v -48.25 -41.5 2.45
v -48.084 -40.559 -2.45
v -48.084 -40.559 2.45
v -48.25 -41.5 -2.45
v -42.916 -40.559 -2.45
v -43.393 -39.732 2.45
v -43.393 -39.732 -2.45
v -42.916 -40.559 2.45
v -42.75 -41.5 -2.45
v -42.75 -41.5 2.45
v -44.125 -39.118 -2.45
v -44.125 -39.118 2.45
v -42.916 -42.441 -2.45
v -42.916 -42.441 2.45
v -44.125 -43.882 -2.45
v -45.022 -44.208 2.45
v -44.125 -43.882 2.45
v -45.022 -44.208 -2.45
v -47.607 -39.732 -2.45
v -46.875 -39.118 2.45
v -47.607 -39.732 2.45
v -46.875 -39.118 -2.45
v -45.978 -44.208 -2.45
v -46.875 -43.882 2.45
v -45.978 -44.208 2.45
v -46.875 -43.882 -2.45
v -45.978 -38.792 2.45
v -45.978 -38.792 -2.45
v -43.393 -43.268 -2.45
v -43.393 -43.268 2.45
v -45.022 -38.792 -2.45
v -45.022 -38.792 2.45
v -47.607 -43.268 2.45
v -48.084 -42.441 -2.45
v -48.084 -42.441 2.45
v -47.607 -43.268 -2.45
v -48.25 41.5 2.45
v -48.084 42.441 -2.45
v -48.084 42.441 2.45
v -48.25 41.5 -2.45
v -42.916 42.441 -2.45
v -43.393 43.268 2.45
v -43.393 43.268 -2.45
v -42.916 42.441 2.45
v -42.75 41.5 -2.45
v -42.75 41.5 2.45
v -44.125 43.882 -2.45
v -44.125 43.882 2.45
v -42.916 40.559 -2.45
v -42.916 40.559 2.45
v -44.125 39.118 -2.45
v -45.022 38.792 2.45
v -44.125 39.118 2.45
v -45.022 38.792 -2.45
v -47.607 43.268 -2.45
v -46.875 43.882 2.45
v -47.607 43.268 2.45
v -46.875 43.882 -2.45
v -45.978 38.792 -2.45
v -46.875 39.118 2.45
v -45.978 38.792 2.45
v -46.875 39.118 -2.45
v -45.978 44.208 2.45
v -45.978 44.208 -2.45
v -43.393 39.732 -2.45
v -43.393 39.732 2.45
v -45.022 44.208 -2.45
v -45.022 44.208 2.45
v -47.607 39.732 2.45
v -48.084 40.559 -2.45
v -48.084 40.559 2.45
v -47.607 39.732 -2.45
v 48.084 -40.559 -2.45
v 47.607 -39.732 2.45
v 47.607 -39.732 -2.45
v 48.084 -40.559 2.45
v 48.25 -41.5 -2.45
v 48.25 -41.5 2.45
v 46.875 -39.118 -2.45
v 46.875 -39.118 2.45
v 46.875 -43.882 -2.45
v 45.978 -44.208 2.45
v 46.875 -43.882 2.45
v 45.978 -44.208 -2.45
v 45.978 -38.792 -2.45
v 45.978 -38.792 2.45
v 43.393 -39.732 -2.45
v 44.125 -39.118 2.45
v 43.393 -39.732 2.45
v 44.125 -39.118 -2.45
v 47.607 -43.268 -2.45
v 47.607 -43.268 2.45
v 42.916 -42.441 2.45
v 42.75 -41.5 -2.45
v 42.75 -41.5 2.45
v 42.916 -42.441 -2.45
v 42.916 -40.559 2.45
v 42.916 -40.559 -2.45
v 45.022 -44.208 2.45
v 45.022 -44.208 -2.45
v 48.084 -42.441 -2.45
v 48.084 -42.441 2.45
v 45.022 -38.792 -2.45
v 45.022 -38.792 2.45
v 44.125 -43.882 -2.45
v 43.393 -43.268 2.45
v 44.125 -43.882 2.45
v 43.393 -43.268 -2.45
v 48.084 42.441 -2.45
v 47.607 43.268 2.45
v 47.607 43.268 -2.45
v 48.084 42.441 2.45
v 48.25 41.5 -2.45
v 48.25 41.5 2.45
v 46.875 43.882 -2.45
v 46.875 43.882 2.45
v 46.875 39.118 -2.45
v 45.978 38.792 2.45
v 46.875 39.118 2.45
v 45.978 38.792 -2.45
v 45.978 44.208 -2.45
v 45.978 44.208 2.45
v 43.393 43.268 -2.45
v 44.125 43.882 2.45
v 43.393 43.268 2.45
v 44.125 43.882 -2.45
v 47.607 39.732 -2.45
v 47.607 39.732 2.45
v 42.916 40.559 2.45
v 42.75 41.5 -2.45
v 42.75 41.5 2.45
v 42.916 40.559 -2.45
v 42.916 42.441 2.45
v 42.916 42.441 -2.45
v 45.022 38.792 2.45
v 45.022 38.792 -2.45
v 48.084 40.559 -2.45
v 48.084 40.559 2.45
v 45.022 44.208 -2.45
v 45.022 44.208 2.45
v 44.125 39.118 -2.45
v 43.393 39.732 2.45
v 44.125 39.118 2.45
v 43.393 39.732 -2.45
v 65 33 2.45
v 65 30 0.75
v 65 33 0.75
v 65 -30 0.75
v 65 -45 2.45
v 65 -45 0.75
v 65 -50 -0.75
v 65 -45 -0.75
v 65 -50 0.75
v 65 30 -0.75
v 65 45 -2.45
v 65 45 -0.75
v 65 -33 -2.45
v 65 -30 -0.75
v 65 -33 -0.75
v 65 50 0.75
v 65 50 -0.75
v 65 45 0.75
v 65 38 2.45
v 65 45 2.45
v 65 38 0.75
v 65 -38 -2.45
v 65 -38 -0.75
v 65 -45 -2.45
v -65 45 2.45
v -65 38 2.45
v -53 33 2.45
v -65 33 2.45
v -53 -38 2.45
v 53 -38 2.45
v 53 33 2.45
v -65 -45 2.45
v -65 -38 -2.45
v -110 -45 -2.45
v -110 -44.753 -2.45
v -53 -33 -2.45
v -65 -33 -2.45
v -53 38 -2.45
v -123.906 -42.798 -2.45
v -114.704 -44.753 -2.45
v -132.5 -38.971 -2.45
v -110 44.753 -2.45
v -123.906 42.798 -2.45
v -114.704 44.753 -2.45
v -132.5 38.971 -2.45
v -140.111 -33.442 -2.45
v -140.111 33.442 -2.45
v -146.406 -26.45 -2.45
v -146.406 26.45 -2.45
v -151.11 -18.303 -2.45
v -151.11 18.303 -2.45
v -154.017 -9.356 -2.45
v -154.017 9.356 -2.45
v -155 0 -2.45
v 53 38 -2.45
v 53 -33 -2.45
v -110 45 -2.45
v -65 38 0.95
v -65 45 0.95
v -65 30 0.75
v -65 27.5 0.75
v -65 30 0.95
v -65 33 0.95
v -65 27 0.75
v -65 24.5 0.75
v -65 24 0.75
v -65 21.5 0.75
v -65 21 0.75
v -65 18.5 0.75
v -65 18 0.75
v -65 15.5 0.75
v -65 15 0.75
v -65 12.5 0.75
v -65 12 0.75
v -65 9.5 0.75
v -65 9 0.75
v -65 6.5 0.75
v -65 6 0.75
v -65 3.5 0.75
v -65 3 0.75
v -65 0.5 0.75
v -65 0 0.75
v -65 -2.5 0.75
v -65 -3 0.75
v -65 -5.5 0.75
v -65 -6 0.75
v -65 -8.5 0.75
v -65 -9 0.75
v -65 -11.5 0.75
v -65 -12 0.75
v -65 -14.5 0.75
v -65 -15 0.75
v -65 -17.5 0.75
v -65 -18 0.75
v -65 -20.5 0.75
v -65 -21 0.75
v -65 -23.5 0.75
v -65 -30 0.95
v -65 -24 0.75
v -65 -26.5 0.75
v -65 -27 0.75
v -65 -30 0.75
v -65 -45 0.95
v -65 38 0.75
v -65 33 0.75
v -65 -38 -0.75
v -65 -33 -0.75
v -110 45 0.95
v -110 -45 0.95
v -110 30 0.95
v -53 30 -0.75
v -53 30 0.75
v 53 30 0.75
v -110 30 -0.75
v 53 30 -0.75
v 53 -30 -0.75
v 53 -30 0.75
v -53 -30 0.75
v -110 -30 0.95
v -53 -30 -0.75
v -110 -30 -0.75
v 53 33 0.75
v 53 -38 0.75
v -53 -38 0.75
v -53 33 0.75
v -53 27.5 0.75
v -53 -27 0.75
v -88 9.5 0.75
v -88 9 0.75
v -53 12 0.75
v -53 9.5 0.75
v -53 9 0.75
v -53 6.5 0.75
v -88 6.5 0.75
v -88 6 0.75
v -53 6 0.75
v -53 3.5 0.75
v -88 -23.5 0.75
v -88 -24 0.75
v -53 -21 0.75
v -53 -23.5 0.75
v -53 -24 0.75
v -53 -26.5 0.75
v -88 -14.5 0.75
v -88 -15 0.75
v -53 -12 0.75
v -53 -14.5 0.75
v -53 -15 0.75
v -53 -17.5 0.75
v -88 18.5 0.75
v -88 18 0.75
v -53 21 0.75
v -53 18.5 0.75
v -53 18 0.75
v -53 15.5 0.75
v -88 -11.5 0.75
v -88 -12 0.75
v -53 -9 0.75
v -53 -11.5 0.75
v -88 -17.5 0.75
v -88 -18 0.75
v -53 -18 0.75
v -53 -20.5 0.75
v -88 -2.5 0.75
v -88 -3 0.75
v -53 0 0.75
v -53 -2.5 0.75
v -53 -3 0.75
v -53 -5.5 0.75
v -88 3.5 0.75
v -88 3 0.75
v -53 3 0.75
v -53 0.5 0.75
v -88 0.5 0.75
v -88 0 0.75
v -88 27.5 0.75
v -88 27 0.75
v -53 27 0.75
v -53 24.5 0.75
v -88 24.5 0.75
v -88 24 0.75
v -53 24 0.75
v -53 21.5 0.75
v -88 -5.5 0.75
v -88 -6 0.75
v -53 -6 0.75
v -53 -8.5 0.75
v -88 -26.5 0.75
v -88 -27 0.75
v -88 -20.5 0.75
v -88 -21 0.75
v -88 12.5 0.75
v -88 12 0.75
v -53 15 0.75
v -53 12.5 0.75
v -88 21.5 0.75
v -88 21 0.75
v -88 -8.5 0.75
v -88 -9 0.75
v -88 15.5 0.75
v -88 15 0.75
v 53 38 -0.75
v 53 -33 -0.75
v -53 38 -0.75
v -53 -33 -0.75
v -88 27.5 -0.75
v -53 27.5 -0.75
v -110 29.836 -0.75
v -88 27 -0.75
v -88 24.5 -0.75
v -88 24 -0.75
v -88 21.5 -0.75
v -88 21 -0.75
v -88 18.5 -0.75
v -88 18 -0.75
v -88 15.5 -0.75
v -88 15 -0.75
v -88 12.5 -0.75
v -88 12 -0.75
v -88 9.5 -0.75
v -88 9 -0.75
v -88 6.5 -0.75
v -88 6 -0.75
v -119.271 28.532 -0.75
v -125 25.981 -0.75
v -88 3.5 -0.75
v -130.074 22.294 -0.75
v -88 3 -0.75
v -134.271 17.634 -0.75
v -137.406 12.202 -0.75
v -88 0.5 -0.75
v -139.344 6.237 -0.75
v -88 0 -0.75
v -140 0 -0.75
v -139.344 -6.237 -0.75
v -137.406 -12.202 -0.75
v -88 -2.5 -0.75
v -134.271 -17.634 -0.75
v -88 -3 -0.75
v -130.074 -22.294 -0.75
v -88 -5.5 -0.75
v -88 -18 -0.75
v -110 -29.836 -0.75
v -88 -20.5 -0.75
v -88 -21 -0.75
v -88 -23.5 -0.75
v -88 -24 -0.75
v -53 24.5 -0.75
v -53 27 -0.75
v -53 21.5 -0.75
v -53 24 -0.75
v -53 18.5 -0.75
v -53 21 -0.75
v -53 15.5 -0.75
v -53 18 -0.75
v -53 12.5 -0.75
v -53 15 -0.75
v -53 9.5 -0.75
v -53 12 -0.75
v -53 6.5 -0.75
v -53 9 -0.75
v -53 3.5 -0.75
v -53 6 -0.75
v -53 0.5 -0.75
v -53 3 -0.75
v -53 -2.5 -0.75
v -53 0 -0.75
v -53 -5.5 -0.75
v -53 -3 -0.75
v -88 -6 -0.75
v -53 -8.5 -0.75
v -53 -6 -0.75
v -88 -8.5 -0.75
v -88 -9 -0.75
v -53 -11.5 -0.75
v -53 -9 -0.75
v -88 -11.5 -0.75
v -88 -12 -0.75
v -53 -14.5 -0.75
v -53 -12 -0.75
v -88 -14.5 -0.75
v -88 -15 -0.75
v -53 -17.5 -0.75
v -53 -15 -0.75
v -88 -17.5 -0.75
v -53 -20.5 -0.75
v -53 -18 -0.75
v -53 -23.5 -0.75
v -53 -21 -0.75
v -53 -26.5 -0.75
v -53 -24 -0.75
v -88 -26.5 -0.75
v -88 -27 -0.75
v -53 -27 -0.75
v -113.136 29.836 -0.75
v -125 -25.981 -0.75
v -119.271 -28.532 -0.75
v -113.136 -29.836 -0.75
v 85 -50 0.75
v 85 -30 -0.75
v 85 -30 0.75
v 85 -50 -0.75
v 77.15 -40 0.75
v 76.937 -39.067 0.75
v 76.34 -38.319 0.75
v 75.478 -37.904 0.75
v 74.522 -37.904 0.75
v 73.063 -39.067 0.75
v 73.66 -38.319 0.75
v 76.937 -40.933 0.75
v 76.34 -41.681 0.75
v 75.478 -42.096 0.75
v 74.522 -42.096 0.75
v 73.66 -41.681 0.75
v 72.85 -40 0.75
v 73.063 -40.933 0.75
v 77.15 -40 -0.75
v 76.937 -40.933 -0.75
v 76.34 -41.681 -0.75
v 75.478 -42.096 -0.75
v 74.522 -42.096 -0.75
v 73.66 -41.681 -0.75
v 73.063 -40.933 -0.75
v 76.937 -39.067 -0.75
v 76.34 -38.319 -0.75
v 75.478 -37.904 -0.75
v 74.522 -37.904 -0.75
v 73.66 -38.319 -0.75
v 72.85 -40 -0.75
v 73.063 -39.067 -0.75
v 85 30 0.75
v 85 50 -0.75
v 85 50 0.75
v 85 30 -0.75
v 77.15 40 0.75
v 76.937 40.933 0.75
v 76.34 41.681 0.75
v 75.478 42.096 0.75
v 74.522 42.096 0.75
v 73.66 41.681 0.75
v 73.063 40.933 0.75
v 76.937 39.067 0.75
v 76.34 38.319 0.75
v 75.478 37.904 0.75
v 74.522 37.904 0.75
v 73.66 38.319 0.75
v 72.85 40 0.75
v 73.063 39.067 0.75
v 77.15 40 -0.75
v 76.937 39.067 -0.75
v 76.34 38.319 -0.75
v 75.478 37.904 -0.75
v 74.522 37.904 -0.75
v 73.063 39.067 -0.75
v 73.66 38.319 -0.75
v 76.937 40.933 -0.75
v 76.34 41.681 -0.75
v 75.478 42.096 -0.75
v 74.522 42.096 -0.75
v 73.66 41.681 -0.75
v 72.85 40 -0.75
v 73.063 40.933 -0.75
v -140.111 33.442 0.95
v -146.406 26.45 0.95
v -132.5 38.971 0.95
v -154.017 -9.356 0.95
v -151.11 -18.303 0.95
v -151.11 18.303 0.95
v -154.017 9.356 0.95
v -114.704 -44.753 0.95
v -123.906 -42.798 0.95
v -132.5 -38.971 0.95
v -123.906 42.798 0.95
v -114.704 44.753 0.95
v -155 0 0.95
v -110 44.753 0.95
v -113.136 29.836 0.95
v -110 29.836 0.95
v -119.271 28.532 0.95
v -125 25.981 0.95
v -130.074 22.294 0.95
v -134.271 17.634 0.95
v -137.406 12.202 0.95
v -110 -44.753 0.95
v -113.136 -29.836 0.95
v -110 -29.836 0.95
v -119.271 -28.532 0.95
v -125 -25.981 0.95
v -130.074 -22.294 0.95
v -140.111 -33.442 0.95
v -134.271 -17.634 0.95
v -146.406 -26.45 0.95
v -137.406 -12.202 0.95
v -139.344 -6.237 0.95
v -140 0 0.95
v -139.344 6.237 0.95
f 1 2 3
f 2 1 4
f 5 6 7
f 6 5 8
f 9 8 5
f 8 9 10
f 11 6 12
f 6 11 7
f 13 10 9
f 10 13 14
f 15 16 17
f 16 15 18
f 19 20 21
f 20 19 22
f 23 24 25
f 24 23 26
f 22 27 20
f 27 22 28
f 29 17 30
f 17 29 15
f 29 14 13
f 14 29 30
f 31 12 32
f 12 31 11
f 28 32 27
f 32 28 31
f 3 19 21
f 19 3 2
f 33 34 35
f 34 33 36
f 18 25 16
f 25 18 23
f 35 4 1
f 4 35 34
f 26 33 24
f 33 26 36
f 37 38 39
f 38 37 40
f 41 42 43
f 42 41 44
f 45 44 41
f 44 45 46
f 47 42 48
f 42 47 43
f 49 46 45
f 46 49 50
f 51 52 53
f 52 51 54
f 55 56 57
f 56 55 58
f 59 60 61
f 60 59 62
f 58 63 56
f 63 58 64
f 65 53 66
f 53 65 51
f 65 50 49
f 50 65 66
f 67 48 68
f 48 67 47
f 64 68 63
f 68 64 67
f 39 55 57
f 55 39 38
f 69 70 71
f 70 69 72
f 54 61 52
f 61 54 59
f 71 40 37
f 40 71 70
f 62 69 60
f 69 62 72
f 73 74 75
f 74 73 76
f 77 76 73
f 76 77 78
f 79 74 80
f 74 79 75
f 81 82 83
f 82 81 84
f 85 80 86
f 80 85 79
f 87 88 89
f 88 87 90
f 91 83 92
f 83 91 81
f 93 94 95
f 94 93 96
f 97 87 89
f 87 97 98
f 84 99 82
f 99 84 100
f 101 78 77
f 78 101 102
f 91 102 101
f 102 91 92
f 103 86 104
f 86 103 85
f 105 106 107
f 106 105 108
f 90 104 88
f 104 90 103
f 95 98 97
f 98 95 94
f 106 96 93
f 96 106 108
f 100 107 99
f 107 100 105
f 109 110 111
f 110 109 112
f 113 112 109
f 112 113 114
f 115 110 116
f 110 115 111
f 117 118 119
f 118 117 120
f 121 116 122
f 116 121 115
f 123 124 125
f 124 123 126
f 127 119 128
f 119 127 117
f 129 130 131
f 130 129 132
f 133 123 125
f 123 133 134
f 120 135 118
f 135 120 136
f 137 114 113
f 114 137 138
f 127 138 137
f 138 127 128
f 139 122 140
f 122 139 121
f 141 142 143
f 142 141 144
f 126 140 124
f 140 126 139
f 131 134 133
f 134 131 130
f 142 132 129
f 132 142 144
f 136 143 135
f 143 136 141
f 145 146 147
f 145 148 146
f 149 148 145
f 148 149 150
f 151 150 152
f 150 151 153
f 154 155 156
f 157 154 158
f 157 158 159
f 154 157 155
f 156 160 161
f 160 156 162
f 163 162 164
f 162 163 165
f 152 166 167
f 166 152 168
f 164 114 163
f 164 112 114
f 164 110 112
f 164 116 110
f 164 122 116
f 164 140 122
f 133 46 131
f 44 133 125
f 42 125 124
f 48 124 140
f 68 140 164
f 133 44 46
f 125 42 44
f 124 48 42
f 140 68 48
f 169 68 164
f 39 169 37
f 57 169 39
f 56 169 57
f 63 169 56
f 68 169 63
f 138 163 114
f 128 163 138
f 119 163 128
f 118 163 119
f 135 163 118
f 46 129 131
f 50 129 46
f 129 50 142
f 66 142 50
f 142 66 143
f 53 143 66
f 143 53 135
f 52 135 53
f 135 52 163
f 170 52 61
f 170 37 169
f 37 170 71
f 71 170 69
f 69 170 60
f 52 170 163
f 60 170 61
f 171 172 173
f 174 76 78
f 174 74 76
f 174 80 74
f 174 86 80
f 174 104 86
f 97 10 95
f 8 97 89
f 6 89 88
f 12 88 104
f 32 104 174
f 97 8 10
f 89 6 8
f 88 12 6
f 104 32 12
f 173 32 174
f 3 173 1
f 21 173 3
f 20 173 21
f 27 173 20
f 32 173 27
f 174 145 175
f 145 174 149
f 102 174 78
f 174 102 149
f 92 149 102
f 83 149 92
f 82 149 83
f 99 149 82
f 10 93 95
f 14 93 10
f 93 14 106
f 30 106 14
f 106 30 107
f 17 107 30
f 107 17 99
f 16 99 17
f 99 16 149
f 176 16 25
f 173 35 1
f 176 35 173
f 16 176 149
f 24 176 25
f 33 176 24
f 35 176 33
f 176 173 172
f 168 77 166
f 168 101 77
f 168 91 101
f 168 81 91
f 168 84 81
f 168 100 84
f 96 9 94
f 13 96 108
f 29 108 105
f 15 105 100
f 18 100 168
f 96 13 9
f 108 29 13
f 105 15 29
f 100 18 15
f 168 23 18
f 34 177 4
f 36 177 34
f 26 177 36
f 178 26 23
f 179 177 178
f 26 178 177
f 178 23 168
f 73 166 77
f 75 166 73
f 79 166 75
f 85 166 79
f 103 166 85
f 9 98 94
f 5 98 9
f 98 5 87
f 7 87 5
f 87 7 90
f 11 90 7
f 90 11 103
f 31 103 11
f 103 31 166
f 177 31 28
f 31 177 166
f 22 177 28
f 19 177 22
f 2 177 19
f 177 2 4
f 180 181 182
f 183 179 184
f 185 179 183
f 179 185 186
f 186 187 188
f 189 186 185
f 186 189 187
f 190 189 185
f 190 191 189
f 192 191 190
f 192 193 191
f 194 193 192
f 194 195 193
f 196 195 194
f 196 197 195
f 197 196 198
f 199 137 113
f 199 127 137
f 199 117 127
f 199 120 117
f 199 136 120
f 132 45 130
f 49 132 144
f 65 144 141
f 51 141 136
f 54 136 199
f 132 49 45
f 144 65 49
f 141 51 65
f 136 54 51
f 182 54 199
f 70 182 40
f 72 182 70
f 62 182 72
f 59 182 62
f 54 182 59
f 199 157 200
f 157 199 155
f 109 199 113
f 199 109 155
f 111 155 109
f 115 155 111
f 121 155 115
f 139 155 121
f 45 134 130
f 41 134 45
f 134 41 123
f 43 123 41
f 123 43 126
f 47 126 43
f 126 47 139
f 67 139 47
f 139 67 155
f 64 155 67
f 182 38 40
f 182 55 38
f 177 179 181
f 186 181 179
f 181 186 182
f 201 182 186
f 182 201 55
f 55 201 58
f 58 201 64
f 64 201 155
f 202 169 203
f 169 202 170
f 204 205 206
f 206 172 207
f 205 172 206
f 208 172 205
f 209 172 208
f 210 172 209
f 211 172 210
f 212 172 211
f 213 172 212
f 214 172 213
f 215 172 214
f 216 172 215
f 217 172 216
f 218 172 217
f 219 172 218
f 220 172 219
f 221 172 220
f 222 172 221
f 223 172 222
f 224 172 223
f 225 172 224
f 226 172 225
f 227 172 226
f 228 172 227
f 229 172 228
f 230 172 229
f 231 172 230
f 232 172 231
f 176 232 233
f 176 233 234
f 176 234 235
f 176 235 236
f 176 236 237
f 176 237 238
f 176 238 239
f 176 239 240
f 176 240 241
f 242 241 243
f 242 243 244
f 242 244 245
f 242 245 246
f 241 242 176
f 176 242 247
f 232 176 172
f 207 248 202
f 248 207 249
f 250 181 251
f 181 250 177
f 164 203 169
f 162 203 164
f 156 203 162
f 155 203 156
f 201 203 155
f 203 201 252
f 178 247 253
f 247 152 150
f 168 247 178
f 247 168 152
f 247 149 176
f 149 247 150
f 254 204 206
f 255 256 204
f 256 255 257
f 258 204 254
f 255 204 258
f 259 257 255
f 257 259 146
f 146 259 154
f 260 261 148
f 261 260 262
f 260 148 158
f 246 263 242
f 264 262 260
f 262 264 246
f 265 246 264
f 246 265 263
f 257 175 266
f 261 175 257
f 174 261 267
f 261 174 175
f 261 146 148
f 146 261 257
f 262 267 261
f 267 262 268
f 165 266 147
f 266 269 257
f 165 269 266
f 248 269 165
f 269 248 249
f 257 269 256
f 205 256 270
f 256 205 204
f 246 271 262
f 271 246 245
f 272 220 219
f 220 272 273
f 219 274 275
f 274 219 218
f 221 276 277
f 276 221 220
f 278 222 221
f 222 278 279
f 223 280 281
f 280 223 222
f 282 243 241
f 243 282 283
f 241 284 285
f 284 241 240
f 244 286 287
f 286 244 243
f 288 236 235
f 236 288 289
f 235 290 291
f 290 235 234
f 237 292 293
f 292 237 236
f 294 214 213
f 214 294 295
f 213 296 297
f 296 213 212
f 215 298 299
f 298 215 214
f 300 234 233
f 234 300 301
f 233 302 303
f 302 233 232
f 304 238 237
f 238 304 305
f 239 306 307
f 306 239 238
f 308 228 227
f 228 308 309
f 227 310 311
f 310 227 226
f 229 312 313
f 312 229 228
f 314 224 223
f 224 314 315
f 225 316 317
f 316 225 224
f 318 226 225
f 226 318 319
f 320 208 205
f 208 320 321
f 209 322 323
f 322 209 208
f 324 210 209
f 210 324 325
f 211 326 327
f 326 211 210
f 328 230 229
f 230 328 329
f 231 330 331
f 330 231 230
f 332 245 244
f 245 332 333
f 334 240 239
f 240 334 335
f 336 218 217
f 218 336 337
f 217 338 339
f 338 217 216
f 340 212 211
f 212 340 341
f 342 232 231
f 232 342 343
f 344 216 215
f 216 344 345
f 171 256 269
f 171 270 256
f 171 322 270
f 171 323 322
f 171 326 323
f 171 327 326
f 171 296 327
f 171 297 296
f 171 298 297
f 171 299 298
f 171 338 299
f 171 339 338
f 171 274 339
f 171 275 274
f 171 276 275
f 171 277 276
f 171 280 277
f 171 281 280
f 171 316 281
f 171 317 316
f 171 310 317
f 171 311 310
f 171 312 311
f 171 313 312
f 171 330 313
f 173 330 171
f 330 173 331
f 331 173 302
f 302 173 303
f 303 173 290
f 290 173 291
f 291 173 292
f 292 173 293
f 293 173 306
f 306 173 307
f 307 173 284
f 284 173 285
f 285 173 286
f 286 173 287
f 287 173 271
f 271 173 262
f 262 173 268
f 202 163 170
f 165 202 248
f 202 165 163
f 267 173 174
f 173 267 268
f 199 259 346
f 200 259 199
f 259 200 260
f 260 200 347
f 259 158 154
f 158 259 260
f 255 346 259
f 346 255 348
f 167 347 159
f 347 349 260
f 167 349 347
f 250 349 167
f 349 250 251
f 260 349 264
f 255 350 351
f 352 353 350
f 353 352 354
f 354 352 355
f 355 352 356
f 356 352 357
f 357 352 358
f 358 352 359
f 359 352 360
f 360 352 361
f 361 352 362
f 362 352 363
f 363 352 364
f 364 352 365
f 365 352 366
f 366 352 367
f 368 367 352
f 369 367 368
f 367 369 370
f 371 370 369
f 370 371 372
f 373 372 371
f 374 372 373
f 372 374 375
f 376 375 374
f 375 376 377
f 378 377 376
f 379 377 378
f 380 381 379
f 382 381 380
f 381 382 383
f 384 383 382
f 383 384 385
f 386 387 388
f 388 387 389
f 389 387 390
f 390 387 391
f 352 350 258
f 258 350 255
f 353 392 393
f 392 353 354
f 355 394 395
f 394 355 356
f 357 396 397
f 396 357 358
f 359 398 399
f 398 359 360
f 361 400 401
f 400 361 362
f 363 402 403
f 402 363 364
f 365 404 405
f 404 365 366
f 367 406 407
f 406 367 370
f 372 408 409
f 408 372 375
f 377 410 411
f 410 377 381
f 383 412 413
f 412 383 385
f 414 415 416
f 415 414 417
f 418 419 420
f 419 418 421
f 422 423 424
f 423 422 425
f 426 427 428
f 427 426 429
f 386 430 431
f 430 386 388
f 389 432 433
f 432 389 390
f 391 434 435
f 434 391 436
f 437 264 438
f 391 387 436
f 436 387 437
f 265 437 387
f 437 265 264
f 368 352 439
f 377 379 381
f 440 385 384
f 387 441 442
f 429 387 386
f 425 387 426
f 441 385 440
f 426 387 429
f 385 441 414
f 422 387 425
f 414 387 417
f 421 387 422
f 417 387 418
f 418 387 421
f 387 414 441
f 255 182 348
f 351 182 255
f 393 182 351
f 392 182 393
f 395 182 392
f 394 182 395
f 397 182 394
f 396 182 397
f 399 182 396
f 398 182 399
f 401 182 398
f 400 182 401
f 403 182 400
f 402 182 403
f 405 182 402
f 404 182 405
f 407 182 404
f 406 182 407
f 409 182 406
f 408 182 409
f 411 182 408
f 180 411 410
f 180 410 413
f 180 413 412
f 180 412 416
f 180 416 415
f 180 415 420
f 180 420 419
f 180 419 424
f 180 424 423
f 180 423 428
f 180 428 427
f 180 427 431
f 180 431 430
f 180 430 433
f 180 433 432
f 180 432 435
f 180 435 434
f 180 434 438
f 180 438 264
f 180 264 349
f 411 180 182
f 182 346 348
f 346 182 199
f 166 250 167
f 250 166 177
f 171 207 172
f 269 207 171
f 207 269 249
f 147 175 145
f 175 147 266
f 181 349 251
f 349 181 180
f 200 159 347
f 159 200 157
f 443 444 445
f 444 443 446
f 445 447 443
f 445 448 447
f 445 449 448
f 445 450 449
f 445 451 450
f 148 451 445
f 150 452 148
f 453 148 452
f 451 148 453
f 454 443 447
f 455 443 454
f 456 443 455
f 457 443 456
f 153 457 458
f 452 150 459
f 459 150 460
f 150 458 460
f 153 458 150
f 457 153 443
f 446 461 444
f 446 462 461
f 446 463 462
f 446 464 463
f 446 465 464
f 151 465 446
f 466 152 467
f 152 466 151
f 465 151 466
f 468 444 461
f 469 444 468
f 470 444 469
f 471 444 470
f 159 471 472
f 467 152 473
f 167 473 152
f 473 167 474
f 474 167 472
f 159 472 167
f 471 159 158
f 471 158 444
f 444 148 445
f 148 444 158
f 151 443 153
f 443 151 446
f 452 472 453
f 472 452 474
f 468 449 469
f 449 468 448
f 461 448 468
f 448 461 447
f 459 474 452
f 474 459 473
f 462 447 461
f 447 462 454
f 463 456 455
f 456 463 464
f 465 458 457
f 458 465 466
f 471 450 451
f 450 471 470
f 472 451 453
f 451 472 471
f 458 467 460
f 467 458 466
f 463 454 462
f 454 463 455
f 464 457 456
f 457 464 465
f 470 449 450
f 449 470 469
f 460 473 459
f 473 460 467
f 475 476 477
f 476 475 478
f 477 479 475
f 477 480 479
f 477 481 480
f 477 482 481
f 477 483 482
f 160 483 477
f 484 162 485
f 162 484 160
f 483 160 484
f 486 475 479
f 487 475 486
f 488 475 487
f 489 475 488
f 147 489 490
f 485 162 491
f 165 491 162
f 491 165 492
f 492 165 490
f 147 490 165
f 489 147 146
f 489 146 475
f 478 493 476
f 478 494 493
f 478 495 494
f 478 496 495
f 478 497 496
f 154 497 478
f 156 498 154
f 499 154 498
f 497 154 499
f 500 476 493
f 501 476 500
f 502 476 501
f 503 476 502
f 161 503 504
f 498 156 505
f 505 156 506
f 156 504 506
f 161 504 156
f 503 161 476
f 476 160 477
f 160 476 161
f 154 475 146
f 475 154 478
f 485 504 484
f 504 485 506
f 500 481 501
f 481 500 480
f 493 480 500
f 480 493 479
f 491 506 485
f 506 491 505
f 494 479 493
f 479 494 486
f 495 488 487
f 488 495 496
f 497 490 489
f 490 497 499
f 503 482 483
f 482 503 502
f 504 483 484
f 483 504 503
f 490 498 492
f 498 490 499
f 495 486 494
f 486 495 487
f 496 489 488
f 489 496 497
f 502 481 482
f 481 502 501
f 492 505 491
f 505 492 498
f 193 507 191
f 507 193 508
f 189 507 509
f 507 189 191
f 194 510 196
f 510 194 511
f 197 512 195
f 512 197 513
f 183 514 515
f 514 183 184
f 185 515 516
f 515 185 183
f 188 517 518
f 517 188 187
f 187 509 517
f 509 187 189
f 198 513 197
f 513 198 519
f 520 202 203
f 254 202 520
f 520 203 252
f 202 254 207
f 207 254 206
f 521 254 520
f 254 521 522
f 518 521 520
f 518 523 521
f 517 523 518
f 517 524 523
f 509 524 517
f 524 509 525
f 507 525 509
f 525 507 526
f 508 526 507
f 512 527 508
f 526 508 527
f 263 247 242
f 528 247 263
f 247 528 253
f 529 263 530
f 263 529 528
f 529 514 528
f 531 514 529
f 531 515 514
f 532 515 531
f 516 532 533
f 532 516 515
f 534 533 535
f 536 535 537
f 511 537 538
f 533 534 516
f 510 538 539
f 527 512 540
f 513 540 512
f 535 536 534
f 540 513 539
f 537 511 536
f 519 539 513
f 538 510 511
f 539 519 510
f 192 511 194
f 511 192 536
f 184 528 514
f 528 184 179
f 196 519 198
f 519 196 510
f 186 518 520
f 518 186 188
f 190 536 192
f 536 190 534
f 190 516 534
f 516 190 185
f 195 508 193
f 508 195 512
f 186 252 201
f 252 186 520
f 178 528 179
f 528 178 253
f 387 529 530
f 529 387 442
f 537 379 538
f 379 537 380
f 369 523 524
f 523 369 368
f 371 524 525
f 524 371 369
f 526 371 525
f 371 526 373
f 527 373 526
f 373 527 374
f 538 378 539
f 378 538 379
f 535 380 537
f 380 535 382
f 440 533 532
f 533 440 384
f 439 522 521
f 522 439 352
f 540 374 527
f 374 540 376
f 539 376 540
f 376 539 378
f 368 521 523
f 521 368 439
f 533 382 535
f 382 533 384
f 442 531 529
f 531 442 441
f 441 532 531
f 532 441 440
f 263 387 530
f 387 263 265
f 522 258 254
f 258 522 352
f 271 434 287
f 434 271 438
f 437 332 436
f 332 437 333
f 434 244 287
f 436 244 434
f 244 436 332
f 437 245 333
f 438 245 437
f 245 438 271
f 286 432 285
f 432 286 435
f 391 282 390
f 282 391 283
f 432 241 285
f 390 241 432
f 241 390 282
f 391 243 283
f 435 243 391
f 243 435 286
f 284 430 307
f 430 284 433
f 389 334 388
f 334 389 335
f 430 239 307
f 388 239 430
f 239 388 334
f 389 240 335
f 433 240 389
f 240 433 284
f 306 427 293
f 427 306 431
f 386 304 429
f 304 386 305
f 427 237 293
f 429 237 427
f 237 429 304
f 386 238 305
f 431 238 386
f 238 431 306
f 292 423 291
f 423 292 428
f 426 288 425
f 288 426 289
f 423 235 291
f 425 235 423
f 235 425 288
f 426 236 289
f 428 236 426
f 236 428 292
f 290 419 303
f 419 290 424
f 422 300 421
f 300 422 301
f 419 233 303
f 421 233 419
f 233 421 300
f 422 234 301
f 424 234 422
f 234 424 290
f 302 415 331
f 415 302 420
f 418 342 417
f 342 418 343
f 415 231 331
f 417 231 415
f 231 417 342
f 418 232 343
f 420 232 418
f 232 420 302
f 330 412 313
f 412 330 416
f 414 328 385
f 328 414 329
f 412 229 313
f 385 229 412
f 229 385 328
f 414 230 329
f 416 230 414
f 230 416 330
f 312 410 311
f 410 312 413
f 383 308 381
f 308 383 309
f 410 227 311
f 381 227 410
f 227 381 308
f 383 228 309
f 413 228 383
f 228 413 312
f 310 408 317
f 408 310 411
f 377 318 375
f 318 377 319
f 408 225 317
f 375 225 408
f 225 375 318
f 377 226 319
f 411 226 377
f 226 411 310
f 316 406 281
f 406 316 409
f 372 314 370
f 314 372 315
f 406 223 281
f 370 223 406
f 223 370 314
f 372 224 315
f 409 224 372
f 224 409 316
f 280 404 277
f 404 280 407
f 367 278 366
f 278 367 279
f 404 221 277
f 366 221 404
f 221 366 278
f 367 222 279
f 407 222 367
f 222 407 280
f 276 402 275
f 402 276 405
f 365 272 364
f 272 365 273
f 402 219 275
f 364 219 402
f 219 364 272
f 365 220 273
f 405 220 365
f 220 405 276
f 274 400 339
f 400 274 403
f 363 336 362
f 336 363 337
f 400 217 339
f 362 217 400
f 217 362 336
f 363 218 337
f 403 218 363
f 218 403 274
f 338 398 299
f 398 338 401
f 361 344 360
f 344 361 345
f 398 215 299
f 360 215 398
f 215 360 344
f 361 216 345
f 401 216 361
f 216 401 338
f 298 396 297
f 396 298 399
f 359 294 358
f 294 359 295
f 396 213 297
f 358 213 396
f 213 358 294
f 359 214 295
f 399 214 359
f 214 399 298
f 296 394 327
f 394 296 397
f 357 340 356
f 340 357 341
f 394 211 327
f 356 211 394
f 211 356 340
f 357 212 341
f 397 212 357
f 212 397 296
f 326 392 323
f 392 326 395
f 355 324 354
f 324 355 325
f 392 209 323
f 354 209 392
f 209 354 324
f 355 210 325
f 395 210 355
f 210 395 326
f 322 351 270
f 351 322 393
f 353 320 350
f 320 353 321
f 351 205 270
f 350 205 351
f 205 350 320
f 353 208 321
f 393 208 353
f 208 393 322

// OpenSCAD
dev_length = 130;
dev_width = 90;

pcb_length = 100;
pcb_width = 70;
pcb_height = 1.7;


screw_hole = 5.5; // M5
banana_hole = 4.3; // M4

pcb_padding = 10; // inner margin
pcb_margin = 6; // outer margin

pcb_spacing = 1.5; // vertical spacing

fin_length = 35;
fin_width = 0.5;
fin_count = 9;
fin_spacing = 3.0;

dev_height = 2 * pcb_height + pcb_spacing;

flowchan_height = pcb_spacing;
connect_width = 5.0;

module body() {

  $fs = 1.0;

  difference() {
    cube([dev_length, dev_width, dev_height], true); // base body

    cube([pcb_length - pcb_padding, pcb_width - pcb_padding, 20], true); // pcb hole

    translate([0, 0, (5 + pcb_spacing) / 2]) cube([pcb_length + pcb_margin, pcb_width + pcb_margin, 5], true); // top pcb insert
    translate([0, 0, -(5 + pcb_spacing) / 2]) cube([pcb_length + pcb_margin, pcb_width + pcb_margin, 5], true); // bottom pcb insert

    translate([0, (pcb_width + pcb_margin - connect_width) / 2, (5 + pcb_spacing) / 2]) cube([2 * dev_length, connect_width, 5], true); // top pcb insert
    translate([0, -(pcb_width + pcb_margin - connect_width) / 2, -(5 + pcb_spacing) / 2]) cube([2 * dev_length, connect_width, 5], true); // bottom pcb insert

    cube([dev_length + 10, pcb_width - pcb_padding, pcb_spacing], true); // flow channel

    // screw holes for 
    union() {
      for (px = [-1:2:1])
        for (py = [-1:2:1]) {
          {
            translate([(pcb_length - 2 * screw_hole + 2) * px / 2, (pcb_width + 2 * screw_hole + 2) * py / 2, 0]) cylinder(20, d=screw_hole, center=true);
          }
        }
    }
  }

  con_size = (dev_length - pcb_length + pcb_padding) / 2;

  for (py = [-1:2:1]) {
    translate([dev_length / 2 + con_size / 2, py * (pcb_width - pcb_padding) / 2 + py * con_size / 2, 0]) difference() {
        cube([con_size, con_size, pcb_spacing], true);
        cylinder(20, d=banana_hole, center=true);
      }
  }

  rounder_height = dev_height - pcb_spacing;

  translate([-dev_length / 2, 0,  -pcb_spacing/2]) {

    difference() {
        union() {
            translate([-dev_width/2,0,0]) cylinder(rounder_height, d=dev_width,center=true);
            translate([-dev_width/4,0,0]) cube([dev_width/2,dev_width, rounder_height],true);
        }
        union() {
            translate([-dev_width/2,0,pcb_height]) cylinder(2*pcb_height, d=pcb_width - pcb_padding,center=true);
            translate([-dev_width/4,0,pcb_height + rounder_height/2]) cube([dev_width/2,pcb_width - pcb_padding, 2*rounder_height],true);
        }
    }

    for(i = [-fin_count:fin_count]) {
        translate([(dev_length - pcb_length - pcb_margin)/2 - fin_length,fin_spacing*i,0]) cube([fin_length,fin_width,flowchan_height]);
    } 
  }
}

body();
